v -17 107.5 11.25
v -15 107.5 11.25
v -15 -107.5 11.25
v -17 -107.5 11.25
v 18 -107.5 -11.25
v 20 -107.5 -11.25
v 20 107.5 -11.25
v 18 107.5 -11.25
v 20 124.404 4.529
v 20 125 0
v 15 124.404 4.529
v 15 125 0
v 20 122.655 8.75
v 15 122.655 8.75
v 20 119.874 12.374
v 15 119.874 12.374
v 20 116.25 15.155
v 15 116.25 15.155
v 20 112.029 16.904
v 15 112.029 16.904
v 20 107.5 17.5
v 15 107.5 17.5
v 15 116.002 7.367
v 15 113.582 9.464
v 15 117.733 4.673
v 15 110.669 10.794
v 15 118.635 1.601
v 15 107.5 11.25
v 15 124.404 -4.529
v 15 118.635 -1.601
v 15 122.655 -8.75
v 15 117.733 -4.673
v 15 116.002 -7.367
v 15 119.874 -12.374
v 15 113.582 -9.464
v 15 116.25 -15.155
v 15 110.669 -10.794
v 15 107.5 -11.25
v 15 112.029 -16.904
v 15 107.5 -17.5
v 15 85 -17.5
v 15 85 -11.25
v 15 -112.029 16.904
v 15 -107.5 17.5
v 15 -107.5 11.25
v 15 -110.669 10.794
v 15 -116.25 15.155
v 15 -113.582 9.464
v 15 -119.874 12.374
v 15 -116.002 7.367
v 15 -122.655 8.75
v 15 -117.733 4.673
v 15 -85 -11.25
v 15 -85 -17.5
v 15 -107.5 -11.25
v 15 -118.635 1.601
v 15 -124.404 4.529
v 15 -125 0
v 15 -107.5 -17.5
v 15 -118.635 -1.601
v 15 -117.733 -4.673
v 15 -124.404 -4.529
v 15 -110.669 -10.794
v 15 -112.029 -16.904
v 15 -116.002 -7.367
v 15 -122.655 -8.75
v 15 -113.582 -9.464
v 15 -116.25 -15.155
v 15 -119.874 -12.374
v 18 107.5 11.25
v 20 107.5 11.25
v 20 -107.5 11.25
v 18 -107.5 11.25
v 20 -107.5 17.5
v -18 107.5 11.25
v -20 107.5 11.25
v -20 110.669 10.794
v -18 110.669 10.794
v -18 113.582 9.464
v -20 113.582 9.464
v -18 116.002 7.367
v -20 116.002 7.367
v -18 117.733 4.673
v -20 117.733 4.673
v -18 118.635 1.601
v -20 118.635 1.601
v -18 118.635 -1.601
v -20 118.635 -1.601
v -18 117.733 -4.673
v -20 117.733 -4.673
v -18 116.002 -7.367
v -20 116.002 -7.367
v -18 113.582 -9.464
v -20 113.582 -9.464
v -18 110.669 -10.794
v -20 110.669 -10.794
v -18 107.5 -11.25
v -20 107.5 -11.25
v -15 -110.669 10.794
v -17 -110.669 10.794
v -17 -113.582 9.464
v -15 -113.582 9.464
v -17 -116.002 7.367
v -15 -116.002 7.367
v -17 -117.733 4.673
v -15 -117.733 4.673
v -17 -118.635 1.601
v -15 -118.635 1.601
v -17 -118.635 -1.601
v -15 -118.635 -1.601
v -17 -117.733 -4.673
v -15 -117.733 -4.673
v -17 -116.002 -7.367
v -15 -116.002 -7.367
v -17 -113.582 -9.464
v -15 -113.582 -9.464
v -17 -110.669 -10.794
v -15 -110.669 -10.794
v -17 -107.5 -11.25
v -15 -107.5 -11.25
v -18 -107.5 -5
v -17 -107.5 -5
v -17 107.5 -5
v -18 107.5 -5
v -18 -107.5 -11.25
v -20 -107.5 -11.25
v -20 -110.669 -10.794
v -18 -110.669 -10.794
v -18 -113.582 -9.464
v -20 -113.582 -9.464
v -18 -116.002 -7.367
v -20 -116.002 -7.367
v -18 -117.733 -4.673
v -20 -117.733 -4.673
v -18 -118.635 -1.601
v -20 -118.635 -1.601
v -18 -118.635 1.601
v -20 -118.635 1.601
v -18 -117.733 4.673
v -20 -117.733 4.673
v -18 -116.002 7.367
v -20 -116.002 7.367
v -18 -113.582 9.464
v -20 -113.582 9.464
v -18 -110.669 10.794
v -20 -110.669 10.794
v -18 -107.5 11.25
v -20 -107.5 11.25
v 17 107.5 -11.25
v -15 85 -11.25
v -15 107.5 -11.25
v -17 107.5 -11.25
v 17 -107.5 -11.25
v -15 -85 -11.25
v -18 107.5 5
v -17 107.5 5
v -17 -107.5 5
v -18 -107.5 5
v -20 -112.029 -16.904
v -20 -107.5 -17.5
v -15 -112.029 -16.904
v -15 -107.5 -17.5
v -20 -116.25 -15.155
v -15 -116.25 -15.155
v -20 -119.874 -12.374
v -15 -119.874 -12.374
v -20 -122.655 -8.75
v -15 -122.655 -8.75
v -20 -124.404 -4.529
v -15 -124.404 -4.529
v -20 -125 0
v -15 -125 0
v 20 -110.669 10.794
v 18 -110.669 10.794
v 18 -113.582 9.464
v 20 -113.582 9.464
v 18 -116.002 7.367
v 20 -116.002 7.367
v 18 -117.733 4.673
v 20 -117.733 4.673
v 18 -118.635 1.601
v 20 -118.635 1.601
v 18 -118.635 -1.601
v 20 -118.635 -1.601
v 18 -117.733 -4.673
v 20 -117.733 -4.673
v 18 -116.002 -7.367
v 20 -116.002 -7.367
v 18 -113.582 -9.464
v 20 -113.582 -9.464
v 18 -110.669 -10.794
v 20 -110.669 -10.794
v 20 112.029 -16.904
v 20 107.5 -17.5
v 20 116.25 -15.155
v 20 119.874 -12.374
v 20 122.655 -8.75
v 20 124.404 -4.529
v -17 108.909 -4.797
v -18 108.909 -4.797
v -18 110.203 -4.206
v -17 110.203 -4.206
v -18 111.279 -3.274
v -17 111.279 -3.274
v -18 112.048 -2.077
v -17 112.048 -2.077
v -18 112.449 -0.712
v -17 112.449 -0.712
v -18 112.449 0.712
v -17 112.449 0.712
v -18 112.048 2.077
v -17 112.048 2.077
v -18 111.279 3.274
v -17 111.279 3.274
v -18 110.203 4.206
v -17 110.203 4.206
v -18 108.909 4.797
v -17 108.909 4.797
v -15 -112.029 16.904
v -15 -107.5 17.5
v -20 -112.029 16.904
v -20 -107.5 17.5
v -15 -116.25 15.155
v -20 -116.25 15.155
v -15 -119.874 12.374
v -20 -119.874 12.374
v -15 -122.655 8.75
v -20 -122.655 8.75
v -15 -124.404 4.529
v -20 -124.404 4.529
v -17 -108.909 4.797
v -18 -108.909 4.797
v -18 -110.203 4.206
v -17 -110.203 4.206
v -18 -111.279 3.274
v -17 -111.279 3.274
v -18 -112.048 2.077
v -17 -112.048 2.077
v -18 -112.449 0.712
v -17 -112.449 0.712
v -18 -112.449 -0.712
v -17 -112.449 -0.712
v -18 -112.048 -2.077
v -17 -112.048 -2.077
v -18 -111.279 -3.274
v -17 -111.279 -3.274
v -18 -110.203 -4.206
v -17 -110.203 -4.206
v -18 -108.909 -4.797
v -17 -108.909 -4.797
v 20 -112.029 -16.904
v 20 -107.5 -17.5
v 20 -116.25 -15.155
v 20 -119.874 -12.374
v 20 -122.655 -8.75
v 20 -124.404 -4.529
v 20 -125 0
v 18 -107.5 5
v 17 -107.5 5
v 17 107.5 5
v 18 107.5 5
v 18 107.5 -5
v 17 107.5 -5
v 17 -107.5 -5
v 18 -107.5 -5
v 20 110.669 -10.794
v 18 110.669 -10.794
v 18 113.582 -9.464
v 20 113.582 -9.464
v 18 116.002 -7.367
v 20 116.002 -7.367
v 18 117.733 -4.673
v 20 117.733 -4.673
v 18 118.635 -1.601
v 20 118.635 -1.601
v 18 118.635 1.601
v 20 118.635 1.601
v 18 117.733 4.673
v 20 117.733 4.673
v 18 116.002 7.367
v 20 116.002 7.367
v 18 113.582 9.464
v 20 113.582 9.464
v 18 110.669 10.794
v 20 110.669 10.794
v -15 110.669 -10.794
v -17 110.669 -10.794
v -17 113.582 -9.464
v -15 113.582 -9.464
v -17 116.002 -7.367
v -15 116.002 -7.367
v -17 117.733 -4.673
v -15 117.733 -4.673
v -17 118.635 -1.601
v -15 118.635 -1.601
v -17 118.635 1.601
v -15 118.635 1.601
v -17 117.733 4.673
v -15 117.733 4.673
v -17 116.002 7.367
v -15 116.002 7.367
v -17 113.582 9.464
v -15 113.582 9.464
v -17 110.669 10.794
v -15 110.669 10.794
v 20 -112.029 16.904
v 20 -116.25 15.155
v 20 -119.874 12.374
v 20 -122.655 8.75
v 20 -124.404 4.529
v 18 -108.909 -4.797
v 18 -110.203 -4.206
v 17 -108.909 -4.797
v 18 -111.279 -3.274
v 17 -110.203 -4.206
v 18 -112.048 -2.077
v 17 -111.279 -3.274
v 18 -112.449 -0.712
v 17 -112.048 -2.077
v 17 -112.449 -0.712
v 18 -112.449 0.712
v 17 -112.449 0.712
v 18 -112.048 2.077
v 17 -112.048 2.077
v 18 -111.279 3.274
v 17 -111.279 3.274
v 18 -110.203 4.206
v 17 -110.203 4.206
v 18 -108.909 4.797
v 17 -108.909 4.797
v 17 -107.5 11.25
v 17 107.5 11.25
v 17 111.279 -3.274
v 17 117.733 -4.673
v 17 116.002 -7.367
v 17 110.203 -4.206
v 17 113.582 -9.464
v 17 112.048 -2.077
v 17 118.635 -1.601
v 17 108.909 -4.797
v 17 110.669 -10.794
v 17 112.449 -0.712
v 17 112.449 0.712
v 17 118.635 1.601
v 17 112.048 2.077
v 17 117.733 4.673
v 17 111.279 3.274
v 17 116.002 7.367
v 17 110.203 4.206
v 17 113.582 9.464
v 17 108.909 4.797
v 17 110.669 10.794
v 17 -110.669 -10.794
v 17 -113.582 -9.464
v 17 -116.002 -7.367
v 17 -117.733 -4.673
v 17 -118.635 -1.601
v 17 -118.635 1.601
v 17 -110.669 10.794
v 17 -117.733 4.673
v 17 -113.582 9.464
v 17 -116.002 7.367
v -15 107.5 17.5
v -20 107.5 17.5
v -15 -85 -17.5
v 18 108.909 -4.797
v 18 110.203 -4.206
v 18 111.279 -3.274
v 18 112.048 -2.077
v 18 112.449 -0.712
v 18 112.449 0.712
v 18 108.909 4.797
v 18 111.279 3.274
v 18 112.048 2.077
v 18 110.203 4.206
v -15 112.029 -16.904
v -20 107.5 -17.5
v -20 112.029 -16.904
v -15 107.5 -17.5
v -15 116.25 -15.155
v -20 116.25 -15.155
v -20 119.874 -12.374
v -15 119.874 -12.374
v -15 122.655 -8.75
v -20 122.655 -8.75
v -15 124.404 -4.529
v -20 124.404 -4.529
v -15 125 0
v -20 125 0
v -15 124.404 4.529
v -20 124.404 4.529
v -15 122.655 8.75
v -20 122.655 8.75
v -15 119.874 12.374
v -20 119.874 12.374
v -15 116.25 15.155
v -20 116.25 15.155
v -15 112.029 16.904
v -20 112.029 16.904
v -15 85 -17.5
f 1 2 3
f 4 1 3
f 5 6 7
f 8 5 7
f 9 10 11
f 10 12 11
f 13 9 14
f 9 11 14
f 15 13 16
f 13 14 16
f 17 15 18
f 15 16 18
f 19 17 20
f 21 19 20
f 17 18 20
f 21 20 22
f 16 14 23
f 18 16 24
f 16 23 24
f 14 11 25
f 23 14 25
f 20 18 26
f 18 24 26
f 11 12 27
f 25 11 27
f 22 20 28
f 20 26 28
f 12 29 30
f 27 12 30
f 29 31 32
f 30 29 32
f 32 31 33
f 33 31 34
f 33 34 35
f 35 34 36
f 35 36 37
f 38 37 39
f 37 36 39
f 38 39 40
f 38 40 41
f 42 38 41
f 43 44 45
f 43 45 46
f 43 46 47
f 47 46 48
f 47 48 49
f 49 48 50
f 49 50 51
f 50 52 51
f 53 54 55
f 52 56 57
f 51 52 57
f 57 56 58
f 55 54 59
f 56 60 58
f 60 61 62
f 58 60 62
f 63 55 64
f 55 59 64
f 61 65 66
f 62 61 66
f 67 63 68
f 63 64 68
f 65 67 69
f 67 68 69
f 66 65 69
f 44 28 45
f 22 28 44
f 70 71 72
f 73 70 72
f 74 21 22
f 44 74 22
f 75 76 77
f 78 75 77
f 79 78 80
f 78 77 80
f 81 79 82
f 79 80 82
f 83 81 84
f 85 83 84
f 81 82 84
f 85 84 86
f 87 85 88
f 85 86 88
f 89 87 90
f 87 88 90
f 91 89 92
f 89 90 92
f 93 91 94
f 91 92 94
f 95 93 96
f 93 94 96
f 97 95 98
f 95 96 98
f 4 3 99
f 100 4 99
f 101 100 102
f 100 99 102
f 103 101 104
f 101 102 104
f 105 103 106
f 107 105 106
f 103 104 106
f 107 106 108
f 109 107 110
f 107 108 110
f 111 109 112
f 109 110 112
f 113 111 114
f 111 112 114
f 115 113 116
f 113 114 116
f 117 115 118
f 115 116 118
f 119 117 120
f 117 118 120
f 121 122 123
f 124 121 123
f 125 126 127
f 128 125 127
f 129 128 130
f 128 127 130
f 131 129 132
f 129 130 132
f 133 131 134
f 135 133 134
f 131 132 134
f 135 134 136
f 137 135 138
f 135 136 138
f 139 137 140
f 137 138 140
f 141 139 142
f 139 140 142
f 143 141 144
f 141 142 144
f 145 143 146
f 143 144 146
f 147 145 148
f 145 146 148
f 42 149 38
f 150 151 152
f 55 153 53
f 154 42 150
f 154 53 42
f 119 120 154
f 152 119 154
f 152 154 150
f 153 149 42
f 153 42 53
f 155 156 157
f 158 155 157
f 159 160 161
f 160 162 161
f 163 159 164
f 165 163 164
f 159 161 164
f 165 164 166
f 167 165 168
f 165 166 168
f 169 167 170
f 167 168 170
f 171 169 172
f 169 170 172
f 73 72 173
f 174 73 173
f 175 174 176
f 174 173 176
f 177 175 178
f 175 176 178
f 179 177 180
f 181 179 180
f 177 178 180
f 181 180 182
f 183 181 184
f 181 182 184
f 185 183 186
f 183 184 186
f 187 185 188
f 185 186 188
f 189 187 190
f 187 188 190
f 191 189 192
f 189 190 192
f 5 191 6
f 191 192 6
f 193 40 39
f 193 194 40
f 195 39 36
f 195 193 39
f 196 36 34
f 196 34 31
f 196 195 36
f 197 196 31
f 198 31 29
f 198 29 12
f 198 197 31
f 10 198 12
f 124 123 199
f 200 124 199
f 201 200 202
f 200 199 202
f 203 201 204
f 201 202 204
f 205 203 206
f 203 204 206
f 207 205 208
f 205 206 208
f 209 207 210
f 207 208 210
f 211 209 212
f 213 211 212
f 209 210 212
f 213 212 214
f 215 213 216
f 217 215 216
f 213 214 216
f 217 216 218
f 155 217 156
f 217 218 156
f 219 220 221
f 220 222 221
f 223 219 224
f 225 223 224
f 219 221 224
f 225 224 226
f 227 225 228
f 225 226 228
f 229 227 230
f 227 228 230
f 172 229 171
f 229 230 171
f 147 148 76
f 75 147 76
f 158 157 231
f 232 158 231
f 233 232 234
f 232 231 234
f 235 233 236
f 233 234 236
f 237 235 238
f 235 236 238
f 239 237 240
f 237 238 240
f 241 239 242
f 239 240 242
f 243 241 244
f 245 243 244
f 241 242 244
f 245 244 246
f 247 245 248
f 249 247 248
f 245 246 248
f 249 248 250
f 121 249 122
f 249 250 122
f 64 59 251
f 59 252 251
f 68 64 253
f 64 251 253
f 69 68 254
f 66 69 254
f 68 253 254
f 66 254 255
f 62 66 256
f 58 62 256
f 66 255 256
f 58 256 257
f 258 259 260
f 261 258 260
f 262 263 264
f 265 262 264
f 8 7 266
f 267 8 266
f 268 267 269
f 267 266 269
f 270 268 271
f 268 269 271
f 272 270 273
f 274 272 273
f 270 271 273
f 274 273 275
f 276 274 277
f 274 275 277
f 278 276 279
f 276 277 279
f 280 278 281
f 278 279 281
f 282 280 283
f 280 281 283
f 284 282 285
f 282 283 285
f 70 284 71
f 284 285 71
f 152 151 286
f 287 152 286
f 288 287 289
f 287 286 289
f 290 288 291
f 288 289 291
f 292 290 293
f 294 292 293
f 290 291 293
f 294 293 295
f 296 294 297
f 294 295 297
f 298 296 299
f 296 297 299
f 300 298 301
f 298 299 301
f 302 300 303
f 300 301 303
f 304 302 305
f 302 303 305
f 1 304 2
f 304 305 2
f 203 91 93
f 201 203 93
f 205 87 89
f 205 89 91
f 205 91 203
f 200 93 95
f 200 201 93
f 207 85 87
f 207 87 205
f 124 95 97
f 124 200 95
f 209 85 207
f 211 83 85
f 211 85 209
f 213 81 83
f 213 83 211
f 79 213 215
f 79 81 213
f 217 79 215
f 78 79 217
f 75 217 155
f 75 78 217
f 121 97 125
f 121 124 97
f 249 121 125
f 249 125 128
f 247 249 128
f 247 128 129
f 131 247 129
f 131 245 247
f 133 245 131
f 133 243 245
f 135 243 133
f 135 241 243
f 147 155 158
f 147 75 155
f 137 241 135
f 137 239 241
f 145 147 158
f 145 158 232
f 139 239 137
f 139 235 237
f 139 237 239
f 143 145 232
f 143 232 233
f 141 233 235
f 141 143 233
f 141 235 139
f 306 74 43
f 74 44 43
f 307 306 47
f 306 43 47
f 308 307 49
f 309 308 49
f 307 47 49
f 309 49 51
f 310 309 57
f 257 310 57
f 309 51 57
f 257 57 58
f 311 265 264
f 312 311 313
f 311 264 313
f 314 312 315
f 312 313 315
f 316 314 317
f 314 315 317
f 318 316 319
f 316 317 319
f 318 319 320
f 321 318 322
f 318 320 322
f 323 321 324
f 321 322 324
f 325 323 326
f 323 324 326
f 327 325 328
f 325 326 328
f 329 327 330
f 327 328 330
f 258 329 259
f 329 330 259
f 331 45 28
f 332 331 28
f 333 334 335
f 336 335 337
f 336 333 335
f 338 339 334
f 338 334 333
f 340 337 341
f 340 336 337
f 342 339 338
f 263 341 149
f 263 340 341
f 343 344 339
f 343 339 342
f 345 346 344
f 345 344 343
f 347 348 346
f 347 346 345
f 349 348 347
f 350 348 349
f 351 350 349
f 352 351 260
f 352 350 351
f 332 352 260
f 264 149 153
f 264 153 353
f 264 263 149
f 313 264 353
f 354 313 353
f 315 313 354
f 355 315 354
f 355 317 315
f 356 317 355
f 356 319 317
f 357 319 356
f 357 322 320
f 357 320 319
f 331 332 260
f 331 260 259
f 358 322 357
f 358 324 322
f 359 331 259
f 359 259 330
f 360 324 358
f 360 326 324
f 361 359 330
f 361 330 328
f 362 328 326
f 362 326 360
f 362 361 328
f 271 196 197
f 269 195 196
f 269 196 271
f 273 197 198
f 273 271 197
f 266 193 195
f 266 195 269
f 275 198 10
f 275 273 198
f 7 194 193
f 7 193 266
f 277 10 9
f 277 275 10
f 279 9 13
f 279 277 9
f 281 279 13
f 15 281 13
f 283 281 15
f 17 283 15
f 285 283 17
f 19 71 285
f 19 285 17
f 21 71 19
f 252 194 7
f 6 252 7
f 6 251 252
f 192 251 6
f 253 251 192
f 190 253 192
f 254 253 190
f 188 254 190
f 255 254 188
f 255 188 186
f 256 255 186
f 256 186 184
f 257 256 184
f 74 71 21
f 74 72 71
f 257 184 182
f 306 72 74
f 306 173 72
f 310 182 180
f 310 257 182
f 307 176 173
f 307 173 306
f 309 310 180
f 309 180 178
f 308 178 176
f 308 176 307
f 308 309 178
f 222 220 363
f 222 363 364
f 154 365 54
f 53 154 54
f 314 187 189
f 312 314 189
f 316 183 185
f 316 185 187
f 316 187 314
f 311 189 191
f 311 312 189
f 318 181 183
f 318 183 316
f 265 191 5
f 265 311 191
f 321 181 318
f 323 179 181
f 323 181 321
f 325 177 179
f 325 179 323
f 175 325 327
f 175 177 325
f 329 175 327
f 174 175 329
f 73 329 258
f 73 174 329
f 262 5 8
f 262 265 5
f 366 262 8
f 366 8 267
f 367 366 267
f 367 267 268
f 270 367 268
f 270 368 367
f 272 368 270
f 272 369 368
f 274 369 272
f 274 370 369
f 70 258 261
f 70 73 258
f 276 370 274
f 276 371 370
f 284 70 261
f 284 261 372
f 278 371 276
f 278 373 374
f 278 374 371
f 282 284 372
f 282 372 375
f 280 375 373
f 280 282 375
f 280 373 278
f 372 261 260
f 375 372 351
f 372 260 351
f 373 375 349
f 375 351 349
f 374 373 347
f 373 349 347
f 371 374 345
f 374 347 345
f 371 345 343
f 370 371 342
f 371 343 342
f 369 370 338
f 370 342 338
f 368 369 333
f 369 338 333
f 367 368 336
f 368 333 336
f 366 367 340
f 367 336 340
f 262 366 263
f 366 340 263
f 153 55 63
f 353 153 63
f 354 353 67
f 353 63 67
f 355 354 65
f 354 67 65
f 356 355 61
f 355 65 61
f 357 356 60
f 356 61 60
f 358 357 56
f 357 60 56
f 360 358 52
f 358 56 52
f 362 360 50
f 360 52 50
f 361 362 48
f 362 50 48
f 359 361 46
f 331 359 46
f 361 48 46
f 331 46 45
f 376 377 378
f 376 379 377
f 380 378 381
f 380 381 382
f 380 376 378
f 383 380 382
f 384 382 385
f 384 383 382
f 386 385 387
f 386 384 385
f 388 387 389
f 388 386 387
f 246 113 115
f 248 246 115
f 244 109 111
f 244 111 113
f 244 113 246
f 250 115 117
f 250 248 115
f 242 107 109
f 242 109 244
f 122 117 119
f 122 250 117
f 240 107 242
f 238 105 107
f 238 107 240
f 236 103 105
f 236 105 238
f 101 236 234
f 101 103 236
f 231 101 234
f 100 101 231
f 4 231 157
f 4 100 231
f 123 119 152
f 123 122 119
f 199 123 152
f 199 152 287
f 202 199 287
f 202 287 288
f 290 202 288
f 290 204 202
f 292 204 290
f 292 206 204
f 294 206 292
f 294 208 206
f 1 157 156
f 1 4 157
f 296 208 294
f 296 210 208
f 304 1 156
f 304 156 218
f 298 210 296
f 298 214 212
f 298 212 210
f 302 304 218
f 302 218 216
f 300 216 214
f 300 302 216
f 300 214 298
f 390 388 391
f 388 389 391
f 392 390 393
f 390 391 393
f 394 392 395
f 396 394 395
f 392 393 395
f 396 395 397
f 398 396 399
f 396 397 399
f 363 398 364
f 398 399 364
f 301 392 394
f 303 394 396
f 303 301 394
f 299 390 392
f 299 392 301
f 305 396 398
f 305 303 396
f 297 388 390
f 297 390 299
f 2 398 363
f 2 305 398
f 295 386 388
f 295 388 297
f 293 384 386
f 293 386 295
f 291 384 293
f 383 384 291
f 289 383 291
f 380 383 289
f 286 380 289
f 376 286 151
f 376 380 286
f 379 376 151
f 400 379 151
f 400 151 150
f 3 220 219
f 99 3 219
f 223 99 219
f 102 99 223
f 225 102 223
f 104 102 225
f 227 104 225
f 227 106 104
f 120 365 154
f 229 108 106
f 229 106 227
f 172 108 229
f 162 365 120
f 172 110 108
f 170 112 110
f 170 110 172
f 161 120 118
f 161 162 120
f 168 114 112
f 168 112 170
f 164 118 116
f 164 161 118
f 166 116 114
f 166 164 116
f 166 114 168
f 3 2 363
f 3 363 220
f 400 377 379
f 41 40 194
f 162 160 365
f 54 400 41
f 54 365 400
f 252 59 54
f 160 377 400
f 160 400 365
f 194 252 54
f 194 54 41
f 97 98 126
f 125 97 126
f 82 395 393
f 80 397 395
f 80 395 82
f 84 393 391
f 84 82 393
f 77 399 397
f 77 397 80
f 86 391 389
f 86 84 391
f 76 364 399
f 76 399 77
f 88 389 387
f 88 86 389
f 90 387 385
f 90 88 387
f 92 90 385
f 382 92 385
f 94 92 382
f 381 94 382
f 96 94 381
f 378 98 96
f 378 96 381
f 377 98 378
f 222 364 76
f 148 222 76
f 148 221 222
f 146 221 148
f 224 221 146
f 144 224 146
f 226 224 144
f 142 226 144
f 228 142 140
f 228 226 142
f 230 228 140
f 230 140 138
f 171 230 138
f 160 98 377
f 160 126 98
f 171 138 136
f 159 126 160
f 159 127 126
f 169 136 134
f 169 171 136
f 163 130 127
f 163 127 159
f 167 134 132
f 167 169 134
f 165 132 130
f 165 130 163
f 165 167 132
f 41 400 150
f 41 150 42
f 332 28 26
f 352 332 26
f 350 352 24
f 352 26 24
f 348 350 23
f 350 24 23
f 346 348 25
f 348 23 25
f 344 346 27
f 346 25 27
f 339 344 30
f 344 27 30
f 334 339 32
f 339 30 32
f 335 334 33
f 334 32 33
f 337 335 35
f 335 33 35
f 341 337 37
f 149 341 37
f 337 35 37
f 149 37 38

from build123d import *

# Parameters (mm, degrees)
F1_DEPTH      = 125
F1_DEPTH_BACK = 125
F6_DEPTH      = 5.0009999999
F7_DEPTH      = 5.0010000001
F8_DEPTH      = 2
F9_DEPTH      = 2
F10_DEPTH     = 2
F11_DEPTH     = 2
F12_W         = 30
F12_H         = 40
F13_DEPTH     = 35.001
F14_R         = 17.49999


# Not quite as in the source:
# - a fillet or chamfer is up to 0.001 mm smaller than in the source, because OpenCascade refuses the exact size


with BuildPart() as f1:
    # F0 (on Front) → F1 (new body, two sides)
    with BuildSketch(Plane.XZ) as f1_sk:
        Polygon((-20, -17.5), (20, -17.5), (20, 17.5), (15, 17.5), (15, -11.25), (-15, -11.25), (-15, 17.5), (-20, 17.5), align=None)
    extrude(amount=F1_DEPTH)
    extrude(f1_sk.sketch, amount=-F1_DEPTH_BACK)

    # F3 (on face) → F6 (cut, through all)
    with BuildSketch(Plane(origin=(15.0000000001, 0, 0), x_dir=(0, -1, 0), z_dir=(-1, 0, 0))):
        with BuildLine():
            Line((107.5, 4.9999999999), (0, 4.9999999999))
            Line((0, 4.9999999999), (-107.5, 4.9999999999))
            ThreePointArc((-107.5, 4.9999999999), (-112.5, -2e-10), (-107.5, -5.0000000004))
            Line((-107.5, -5.0000000004), (0, -5.0000000004))
            Line((0, -5.0000000004), (107.5, -5.0000000004))
            ThreePointArc((107.5, -5.0000000004), (112.5000000001, -2e-10), (107.5, 4.9999999999))
        make_face()
    extrude(amount=-F6_DEPTH, mode=Mode.SUBTRACT)

    # F2 (on face) → F7 (cut, through all)
    with BuildSketch(Plane.YZ.offset(-14.9999999999)):
        with BuildLine():
            Line((107.5, 5), (0, 5))
            Line((0, 5), (-107.5, 5))
            ThreePointArc((-107.5, 5), (-112.5, 0), (-107.5, -5))
            Line((-107.5, -5), (0, -5))
            Line((0, -5), (107.5, -5))
            ThreePointArc((107.5, -5), (112.5, 0), (107.5, 5))
        make_face()
    extrude(amount=-F7_DEPTH, mode=Mode.SUBTRACT)

    # F3 (on face) → F8 (cut)
    with BuildSketch(Plane(origin=(15.0000000001, 0, 0), x_dir=(0, -1, 0), z_dir=(-1, 0, 0))):
        with BuildLine():
            Line((107.5, 11.25), (0, 11.25))
            Line((0, 11.25), (-107.5, 11.25))
            ThreePointArc((-107.5, 11.25), (-118.7500000002, -2e-10), (-107.5, -11.2500000005))
            Line((-107.5, -11.2500000005), (0, -11.2500000005))
            Line((0, -11.2500000005), (107.5, -11.2500000005))
            ThreePointArc((107.5, -11.2500000005), (118.7500000002, -2e-10), (107.5, 11.25))
        make_face()
        with BuildLine():
            Line((-107.5, 4.9999999999), (0, 4.9999999999))
            Line((0, 4.9999999999), (107.5, 4.9999999999))
            ThreePointArc((107.5, 4.9999999999), (112.5000000001, -2e-10), (107.5, -5.0000000004))
            Line((107.5, -5.0000000004), (0, -5.0000000004))
            Line((0, -5.0000000004), (-107.5, -5.0000000004))
            ThreePointArc((-107.5, -5.0000000004), (-112.5, -2e-10), (-107.5, 4.9999999999))
        make_face(mode=Mode.SUBTRACT)
    extrude(amount=-F8_DEPTH, mode=Mode.SUBTRACT)

    # F2 (on face) → F9 (cut)
    with BuildSketch(Plane.YZ.offset(-14.9999999999)):
        with BuildLine():
            Line((107.5, 11.25), (0, 11.25))
            Line((0, 11.25), (-107.5, 11.25))
            ThreePointArc((-107.5, 11.25), (-118.75, 0), (-107.5, -11.25))
            Line((-107.5, -11.25), (0, -11.25))
            Line((0, -11.25), (107.5, -11.25))
            ThreePointArc((107.5, -11.25), (118.75, 0), (107.5, 11.25))
        make_face()
        with BuildLine():
            Line((-107.5, 5), (0, 5))
            Line((0, 5), (107.5, 5))
            ThreePointArc((107.5, 5), (112.5, 0), (107.5, -5))
            Line((107.5, -5), (0, -5))
            Line((0, -5), (-107.5, -5))
            ThreePointArc((-107.5, -5), (-112.5, 0), (-107.5, 5))
        make_face(mode=Mode.SUBTRACT)
    extrude(amount=-F9_DEPTH, mode=Mode.SUBTRACT)

    # F4 (on face) → F10 (cut)
    with BuildSketch(Plane(origin=(-20, 0, 1e-10), x_dir=(0, -1, 0), z_dir=(-1, 0, 0))):
        with BuildLine():
            Line((107.5, 11.25), (0, 11.25))
            Line((0, 11.25), (-107.5, 11.25))
            ThreePointArc((-107.5, 11.25), (-118.75, 0), (-107.5, -11.25))
            Line((-107.5, -11.25), (0, -11.25))
            Line((0, -11.25), (107.5, -11.25))
            ThreePointArc((107.5, -11.25), (118.75, 0), (107.5, 11.25))
        make_face()
        with BuildLine():
            Line((-107.5, 5), (0, 5))
            Line((0, 5), (107.5, 5))
            ThreePointArc((107.5, 5), (112.5, 0), (107.5, -5))
            Line((107.5, -5), (0, -5))
            Line((0, -5), (-107.5, -5))
            ThreePointArc((-107.5, -5), (-112.5, 0), (-107.5, 5))
        make_face(mode=Mode.SUBTRACT)
    extrude(amount=-F10_DEPTH, mode=Mode.SUBTRACT)

    # F5 (on face) → F11 (cut)
    with BuildSketch(Plane.YZ.offset(20)):
        with BuildLine():
            Line((107.5, 11.25), (0, 11.25))
            Line((0, 11.25), (-107.5, 11.25))
            ThreePointArc((-107.5, 11.25), (-118.75, 0), (-107.5, -11.25))
            Line((-107.5, -11.25), (0, -11.25))
            Line((0, -11.25), (107.5, -11.25))
            ThreePointArc((107.5, -11.25), (118.75, 0), (107.5, 11.25))
        make_face()
        with BuildLine():
            Line((-107.5, 5), (0, 5))
            Line((0, 5), (107.5, 5))
            ThreePointArc((107.5, 5), (112.5, 0), (107.5, -5))
            Line((107.5, -5), (0, -5))
            Line((0, -5), (-107.5, -5))
            ThreePointArc((-107.5, -5), (-112.5, 0), (-107.5, 5))
        make_face(mode=Mode.SUBTRACT)
    extrude(amount=-F11_DEPTH, mode=Mode.SUBTRACT)

    # F12 (on face) → F13 (cut, through all)
    with BuildSketch(Plane(origin=(0, 0, -17.5), x_dir=(1, 0, 0), z_dir=(0, 0, -1))):
        with Locations((-2e-10, -105)):
            Rectangle(F12_W, F12_H)
        with Locations((-2e-10, 105)):
            Rectangle(F12_W, F12_H)
    extrude(amount=-F13_DEPTH, mode=Mode.SUBTRACT)

    # F14 (radius 17.5 in the source; OpenCascade refuses exactly that, so slightly less here)
    f14_edges = [f1.edges().sort_by_distance(p)[0] for p in [
        (17.5, 125, 17.5),
        (17.5, 125, -17.5),
        (-17.5, 125, -17.5),
        (-17.5, 125, 17.5),
        (-17.5, -125, -17.5),
        (-17.5, -125, 17.5),
        (17.5, -125, 17.5),
        (17.5, -125, -17.5),
    ]]
    fillet(f14_edges, radius=F14_R)


solid = f1.part
